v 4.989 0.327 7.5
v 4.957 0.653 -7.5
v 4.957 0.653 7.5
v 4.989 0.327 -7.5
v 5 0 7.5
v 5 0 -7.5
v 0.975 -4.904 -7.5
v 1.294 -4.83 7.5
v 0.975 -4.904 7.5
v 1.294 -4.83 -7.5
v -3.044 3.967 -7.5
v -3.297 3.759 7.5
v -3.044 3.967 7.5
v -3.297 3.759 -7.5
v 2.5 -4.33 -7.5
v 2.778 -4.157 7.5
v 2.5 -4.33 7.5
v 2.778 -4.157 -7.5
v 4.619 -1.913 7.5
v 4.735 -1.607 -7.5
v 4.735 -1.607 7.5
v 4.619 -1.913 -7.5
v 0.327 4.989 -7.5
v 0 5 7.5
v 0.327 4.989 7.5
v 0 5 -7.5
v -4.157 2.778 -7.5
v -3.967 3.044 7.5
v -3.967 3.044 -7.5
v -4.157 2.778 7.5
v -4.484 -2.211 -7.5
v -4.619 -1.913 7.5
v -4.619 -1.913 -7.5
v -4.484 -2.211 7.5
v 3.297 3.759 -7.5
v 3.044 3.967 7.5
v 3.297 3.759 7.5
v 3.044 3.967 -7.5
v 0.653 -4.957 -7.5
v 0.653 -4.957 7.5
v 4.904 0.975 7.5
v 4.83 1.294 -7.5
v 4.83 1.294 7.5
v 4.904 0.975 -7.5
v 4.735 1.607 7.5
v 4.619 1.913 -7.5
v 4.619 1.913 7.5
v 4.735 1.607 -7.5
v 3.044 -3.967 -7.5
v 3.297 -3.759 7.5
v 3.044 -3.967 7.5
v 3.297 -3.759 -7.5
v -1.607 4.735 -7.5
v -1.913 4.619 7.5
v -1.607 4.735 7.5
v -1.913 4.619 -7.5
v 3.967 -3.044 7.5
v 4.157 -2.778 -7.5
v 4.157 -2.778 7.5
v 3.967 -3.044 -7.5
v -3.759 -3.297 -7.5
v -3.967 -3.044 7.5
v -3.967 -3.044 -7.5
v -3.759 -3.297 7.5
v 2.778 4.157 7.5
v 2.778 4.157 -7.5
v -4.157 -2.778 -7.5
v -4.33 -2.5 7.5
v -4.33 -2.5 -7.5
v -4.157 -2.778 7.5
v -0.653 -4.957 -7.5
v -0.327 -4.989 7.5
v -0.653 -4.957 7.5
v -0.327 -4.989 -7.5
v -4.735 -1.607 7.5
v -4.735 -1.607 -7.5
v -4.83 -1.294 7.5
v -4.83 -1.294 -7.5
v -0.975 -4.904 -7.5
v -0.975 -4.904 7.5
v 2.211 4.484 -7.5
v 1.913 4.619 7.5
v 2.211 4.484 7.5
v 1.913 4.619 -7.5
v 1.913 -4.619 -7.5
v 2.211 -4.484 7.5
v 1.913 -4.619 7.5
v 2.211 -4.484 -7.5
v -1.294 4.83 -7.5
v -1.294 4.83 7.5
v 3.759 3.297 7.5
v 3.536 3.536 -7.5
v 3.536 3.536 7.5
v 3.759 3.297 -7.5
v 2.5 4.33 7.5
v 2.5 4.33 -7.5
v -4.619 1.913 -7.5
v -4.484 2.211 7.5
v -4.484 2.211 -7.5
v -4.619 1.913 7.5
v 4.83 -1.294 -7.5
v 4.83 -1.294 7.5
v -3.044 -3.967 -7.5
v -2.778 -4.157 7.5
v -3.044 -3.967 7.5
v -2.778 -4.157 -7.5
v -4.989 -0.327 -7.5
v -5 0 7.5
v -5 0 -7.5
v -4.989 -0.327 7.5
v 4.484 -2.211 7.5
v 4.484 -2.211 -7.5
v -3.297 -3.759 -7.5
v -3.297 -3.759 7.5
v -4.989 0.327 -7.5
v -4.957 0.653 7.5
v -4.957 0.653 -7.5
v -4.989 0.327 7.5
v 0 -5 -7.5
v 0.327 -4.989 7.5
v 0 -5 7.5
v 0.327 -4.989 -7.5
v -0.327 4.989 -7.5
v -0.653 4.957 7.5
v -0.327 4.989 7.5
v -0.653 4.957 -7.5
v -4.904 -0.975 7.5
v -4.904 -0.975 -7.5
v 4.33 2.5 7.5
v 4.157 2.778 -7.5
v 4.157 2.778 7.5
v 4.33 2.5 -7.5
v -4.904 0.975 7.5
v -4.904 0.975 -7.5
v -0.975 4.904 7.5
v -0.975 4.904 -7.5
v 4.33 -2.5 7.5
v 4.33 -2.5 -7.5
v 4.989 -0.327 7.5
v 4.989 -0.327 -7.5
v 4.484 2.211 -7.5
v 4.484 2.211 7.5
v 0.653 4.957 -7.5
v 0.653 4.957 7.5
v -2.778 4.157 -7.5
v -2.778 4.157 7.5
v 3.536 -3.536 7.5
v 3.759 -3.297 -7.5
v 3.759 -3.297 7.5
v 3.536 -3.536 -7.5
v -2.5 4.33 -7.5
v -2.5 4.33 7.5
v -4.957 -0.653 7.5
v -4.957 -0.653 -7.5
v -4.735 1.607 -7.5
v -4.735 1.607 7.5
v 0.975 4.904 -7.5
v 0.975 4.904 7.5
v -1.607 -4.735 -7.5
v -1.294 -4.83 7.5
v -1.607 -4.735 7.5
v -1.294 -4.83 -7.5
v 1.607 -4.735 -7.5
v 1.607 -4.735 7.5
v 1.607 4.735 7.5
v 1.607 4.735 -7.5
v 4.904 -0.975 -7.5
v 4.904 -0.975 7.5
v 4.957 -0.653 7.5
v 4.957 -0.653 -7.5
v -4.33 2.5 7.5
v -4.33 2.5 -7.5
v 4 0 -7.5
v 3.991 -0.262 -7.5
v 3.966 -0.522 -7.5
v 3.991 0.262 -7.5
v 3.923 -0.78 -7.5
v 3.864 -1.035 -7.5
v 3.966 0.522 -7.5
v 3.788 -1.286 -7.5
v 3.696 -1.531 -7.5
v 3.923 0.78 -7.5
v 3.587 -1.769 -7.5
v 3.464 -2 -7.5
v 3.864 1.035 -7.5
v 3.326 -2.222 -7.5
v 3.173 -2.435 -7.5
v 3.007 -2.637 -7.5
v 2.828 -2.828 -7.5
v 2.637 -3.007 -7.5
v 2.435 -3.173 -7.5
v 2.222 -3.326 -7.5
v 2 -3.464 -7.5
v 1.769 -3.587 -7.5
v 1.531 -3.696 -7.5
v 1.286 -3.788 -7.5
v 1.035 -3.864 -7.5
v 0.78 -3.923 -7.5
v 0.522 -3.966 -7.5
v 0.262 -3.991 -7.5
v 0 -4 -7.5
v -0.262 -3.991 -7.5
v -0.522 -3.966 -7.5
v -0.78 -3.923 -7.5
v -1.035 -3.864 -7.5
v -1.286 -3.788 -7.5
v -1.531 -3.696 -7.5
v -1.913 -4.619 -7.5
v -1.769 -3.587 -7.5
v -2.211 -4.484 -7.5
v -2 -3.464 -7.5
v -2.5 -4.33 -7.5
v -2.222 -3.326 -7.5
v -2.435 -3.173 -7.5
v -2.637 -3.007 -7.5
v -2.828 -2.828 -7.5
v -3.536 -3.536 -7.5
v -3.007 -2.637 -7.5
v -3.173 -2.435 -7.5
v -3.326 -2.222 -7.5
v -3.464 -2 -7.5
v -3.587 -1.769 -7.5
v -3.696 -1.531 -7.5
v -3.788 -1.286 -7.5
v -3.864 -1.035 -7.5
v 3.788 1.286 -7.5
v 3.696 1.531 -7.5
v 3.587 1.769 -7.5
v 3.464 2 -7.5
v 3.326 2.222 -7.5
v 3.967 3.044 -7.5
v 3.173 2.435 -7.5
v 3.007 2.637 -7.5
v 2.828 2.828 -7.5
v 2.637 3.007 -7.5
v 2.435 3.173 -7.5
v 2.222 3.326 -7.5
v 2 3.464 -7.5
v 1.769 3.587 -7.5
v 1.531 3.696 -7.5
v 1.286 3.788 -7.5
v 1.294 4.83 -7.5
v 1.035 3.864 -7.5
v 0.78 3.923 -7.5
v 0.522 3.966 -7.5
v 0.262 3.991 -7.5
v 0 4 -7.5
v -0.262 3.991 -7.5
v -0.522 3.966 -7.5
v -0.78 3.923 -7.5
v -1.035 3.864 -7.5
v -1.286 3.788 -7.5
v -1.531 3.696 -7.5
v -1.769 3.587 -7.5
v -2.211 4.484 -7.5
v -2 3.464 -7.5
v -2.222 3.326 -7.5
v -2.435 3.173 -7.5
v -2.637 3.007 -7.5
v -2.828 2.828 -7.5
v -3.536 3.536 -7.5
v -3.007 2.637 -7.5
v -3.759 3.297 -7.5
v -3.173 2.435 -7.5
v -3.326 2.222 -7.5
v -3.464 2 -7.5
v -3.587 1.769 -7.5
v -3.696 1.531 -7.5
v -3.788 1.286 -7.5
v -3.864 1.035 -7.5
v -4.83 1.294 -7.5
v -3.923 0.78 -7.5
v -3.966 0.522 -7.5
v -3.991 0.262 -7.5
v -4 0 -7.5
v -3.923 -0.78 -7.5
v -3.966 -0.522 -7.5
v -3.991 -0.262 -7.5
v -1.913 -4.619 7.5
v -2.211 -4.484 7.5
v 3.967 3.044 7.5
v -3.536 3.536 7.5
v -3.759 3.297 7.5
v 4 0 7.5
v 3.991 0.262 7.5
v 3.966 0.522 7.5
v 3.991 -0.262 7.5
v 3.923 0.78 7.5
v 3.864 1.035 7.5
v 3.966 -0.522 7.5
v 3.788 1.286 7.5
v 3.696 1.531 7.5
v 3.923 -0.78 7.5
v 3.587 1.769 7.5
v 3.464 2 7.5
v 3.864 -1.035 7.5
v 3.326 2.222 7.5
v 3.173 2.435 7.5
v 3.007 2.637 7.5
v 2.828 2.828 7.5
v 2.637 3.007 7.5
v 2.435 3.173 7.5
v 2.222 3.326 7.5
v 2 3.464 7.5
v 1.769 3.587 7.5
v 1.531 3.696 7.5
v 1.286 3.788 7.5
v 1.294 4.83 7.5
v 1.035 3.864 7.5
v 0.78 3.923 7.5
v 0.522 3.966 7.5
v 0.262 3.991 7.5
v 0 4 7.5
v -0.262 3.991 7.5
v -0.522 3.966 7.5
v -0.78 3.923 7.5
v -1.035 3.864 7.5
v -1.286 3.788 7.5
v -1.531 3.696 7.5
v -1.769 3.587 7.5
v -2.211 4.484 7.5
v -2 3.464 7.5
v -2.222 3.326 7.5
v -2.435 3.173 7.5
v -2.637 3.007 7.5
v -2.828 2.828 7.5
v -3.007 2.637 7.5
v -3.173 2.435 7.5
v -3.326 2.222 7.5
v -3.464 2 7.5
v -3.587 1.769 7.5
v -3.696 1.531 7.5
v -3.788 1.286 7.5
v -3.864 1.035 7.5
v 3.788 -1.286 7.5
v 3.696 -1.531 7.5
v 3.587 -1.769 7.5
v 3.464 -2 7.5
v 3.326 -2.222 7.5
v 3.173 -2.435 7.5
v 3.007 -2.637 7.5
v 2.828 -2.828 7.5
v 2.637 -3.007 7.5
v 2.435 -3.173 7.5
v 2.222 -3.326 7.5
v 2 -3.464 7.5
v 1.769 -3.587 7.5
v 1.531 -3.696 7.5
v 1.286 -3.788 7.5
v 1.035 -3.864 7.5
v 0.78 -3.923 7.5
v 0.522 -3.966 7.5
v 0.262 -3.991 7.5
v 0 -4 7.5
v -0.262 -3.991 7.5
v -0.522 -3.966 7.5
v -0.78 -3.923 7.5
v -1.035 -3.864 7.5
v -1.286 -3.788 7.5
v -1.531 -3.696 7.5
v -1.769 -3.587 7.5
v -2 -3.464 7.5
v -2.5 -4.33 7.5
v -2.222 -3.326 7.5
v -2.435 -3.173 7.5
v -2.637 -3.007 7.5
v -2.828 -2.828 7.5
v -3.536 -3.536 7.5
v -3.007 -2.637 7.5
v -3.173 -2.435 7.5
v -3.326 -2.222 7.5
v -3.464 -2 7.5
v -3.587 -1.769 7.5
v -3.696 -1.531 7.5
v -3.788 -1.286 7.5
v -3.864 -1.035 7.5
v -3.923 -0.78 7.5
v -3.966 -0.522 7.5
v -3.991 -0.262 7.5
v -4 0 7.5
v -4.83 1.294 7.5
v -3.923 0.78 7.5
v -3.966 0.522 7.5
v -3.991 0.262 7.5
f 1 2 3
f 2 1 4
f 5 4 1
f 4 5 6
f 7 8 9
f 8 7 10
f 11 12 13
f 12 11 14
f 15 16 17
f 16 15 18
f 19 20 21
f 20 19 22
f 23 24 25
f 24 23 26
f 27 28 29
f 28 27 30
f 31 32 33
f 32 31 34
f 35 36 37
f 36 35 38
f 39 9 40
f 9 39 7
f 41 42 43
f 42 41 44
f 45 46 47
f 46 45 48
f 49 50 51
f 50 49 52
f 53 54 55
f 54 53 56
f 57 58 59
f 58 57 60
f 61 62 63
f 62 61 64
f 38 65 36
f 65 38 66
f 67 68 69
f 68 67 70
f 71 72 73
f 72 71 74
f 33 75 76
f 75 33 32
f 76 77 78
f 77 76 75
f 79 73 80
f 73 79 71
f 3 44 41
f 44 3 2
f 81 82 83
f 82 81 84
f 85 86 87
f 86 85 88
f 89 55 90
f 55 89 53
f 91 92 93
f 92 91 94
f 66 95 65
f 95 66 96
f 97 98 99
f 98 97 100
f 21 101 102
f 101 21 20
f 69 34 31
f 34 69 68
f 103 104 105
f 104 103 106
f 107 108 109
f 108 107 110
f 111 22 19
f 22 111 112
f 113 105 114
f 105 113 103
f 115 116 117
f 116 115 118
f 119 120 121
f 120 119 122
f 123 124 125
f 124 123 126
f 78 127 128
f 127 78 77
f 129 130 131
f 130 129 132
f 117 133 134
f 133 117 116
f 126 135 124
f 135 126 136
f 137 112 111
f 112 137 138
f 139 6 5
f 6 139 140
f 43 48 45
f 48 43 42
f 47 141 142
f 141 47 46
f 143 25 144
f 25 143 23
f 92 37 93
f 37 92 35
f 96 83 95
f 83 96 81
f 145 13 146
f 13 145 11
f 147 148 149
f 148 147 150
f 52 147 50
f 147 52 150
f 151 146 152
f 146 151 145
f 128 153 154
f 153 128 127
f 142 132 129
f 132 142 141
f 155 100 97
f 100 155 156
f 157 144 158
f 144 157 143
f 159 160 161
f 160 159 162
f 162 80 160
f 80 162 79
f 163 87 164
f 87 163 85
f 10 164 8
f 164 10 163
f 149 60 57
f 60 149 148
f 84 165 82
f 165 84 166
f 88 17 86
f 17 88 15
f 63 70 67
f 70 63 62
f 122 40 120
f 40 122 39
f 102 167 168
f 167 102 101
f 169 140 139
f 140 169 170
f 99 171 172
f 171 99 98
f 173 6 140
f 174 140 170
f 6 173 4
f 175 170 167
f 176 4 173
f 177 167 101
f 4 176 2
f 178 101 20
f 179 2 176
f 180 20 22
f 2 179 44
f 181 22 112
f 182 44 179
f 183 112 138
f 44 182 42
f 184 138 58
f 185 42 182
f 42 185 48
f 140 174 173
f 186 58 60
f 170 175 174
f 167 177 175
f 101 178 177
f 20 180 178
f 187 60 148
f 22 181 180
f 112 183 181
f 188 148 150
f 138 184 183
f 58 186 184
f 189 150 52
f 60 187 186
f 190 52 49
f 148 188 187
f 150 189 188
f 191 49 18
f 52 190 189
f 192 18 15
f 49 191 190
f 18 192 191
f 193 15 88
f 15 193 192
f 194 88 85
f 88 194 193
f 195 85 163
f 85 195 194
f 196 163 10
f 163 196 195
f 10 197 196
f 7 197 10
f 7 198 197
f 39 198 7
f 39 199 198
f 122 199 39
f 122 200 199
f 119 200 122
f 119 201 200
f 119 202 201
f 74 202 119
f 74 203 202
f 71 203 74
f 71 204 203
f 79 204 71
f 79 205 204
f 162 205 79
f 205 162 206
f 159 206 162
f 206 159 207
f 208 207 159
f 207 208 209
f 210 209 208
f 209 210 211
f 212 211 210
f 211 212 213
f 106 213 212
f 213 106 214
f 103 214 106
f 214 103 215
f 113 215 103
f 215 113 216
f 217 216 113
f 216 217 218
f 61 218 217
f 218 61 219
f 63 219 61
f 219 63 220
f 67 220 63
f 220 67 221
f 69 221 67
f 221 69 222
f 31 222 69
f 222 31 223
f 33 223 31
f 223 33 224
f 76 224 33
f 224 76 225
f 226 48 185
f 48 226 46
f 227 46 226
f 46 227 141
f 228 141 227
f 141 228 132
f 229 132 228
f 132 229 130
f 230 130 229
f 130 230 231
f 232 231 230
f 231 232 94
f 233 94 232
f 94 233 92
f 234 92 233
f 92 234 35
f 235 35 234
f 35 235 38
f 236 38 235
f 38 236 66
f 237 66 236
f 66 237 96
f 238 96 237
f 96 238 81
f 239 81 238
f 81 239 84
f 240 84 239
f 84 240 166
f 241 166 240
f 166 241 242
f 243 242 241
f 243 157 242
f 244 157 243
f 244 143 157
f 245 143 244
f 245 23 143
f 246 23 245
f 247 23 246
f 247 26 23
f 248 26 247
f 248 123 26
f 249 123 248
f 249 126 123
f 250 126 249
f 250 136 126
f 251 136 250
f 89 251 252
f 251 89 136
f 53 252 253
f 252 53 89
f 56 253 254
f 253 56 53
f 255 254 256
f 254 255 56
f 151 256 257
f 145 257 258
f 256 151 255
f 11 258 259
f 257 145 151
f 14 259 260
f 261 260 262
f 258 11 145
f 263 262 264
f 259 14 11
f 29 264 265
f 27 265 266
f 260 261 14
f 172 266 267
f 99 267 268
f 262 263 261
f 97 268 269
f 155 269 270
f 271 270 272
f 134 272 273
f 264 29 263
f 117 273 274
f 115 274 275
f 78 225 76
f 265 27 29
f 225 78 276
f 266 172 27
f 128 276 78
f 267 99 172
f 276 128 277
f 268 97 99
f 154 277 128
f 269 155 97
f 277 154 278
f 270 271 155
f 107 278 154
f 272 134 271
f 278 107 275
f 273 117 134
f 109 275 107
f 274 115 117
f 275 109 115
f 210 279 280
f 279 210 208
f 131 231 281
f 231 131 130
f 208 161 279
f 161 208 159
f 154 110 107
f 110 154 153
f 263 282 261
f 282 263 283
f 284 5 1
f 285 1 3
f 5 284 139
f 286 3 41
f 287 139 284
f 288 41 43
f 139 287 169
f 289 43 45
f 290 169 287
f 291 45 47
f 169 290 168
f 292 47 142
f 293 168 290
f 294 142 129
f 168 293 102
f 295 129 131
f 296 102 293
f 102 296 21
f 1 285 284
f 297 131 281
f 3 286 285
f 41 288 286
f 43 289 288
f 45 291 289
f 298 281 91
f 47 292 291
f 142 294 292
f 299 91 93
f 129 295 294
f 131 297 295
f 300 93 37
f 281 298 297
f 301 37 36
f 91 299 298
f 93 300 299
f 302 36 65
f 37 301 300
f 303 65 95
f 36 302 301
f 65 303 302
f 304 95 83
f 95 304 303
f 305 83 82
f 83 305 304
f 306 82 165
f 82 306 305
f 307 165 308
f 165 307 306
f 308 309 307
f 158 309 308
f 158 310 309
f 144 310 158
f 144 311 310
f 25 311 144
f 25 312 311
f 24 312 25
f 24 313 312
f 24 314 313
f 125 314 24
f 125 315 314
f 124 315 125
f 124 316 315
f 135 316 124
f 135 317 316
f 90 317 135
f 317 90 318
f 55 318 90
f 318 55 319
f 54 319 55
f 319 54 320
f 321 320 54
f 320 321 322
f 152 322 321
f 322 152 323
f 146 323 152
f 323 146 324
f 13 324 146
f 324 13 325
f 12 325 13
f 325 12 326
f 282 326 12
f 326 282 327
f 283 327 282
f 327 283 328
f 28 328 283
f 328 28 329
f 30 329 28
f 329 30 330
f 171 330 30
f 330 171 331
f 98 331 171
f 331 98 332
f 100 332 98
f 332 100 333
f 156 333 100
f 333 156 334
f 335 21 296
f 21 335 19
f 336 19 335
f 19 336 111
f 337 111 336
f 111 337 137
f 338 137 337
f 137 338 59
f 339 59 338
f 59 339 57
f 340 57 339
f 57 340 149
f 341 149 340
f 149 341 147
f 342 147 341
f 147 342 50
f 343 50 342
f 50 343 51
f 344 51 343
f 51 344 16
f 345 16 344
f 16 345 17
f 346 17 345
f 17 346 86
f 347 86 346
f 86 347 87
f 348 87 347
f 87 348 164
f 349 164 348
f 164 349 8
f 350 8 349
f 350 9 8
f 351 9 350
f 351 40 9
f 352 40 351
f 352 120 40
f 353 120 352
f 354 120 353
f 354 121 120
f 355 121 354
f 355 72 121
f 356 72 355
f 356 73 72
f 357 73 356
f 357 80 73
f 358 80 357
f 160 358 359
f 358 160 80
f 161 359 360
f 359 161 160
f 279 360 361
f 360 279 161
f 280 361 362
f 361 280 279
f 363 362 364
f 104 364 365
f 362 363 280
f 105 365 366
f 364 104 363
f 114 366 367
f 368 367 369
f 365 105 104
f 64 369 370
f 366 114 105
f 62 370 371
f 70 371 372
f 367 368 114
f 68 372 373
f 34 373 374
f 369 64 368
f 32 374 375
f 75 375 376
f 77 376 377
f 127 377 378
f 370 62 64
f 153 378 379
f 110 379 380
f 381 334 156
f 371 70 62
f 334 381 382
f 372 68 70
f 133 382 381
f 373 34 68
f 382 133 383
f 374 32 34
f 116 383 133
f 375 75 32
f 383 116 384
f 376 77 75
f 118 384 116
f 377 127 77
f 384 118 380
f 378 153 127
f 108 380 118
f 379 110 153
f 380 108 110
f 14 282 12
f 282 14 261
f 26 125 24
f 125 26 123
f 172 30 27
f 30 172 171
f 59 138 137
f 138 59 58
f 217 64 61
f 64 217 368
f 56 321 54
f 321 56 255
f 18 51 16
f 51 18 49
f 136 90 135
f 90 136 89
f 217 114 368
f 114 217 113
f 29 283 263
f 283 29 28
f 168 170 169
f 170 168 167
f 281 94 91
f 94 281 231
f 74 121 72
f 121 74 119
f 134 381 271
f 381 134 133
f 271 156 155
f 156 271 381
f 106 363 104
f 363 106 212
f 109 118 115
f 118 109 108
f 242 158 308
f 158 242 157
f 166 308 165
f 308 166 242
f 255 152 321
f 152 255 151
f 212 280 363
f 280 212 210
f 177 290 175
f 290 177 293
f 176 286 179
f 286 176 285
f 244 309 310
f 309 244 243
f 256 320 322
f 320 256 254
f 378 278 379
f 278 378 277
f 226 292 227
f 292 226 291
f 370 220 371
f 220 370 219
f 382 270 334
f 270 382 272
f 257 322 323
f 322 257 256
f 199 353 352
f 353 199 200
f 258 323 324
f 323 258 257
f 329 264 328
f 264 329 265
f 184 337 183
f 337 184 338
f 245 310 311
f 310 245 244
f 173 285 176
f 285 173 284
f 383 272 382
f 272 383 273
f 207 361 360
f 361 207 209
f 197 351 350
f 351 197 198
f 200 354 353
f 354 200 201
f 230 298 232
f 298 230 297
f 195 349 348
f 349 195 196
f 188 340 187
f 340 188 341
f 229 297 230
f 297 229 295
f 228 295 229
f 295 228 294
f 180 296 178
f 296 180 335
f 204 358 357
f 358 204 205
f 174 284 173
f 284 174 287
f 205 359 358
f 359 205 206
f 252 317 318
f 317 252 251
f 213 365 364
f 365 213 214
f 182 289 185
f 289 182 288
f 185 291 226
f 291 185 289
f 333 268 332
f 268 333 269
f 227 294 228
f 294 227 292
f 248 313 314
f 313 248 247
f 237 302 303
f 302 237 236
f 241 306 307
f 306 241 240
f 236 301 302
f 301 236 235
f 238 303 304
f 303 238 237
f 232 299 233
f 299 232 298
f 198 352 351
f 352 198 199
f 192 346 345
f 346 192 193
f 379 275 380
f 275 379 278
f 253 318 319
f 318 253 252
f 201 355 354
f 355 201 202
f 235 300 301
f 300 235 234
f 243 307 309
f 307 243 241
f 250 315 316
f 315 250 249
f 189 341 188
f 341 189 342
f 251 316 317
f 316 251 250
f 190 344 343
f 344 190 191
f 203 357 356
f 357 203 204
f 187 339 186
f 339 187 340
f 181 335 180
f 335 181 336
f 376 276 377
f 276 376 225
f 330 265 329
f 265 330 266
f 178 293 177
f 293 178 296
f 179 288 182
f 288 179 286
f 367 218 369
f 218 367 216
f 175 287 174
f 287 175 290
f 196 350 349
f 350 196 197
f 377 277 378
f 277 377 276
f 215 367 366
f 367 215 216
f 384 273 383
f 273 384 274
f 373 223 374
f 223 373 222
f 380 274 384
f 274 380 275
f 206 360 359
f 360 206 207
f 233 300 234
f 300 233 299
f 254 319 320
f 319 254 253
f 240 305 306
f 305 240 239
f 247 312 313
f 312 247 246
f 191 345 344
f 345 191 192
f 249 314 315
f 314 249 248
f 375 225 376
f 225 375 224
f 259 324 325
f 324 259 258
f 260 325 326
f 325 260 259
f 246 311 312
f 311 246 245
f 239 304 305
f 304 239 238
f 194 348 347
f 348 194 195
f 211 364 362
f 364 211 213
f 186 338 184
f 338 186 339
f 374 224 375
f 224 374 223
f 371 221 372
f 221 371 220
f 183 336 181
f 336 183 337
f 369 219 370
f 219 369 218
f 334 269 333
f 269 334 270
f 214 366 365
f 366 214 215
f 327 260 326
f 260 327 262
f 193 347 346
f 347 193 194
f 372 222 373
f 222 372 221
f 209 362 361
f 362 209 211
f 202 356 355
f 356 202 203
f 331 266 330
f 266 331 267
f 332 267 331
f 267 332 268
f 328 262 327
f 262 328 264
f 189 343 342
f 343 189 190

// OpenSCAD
// PVC aquarium tubing (single connected solid: hollow tube)

// Parameters
length = 15; //[7.5:30:0.5]
outer_diameter = 10; //[5:20:0.5]
inner_diameter = 8; //[4:16:0.5]
forced_id = 0; //[0:16:0.5]
center = 1; //[0:1:1]
overlap = 1; //[0.5:2:0.1]

$fn = 96;

module tubing() {
    od = max(outer_diameter, 0.01);
    id_req = (forced_id > 0) ? forced_id : inner_diameter;

    // Keep a minimum wall thickness to avoid invalid/zero-thickness geometry
    min_wall = 0.5; // mm
    id_max = max(0, od - 2*min_wall);
    id = min(max(id_req, 0), id_max);

    h = max(length, 0.01);

    // Make the bore slightly longer so it always cuts through cleanly
    inner_h = h + 2*overlap;

    color([0.85, 0.85, 0.8])
    difference() {
        cylinder(d=od, h=h, center=(center==1));
        cylinder(d=id, h=inner_h, center=(center==1));
    }
}

tubing();
